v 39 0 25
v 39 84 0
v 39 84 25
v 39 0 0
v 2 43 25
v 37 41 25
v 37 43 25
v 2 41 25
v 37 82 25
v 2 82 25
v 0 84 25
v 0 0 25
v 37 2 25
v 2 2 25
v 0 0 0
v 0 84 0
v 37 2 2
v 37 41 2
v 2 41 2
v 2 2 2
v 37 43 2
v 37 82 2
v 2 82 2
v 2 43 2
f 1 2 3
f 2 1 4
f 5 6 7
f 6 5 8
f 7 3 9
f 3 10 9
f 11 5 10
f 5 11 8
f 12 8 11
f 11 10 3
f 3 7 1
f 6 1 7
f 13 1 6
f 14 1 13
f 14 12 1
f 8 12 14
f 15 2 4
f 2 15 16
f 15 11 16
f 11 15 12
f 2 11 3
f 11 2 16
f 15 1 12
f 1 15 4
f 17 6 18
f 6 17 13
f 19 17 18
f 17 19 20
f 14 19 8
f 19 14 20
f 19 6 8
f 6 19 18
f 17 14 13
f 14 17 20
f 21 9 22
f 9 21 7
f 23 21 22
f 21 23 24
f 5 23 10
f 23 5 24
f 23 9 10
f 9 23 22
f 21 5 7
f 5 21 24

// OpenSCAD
difference()
{
  cube([39,84,25]);
  translate([2,2,2]) cube([35,39,25]);
  translate([2,43,2]) cube([35,39,25]);
}
